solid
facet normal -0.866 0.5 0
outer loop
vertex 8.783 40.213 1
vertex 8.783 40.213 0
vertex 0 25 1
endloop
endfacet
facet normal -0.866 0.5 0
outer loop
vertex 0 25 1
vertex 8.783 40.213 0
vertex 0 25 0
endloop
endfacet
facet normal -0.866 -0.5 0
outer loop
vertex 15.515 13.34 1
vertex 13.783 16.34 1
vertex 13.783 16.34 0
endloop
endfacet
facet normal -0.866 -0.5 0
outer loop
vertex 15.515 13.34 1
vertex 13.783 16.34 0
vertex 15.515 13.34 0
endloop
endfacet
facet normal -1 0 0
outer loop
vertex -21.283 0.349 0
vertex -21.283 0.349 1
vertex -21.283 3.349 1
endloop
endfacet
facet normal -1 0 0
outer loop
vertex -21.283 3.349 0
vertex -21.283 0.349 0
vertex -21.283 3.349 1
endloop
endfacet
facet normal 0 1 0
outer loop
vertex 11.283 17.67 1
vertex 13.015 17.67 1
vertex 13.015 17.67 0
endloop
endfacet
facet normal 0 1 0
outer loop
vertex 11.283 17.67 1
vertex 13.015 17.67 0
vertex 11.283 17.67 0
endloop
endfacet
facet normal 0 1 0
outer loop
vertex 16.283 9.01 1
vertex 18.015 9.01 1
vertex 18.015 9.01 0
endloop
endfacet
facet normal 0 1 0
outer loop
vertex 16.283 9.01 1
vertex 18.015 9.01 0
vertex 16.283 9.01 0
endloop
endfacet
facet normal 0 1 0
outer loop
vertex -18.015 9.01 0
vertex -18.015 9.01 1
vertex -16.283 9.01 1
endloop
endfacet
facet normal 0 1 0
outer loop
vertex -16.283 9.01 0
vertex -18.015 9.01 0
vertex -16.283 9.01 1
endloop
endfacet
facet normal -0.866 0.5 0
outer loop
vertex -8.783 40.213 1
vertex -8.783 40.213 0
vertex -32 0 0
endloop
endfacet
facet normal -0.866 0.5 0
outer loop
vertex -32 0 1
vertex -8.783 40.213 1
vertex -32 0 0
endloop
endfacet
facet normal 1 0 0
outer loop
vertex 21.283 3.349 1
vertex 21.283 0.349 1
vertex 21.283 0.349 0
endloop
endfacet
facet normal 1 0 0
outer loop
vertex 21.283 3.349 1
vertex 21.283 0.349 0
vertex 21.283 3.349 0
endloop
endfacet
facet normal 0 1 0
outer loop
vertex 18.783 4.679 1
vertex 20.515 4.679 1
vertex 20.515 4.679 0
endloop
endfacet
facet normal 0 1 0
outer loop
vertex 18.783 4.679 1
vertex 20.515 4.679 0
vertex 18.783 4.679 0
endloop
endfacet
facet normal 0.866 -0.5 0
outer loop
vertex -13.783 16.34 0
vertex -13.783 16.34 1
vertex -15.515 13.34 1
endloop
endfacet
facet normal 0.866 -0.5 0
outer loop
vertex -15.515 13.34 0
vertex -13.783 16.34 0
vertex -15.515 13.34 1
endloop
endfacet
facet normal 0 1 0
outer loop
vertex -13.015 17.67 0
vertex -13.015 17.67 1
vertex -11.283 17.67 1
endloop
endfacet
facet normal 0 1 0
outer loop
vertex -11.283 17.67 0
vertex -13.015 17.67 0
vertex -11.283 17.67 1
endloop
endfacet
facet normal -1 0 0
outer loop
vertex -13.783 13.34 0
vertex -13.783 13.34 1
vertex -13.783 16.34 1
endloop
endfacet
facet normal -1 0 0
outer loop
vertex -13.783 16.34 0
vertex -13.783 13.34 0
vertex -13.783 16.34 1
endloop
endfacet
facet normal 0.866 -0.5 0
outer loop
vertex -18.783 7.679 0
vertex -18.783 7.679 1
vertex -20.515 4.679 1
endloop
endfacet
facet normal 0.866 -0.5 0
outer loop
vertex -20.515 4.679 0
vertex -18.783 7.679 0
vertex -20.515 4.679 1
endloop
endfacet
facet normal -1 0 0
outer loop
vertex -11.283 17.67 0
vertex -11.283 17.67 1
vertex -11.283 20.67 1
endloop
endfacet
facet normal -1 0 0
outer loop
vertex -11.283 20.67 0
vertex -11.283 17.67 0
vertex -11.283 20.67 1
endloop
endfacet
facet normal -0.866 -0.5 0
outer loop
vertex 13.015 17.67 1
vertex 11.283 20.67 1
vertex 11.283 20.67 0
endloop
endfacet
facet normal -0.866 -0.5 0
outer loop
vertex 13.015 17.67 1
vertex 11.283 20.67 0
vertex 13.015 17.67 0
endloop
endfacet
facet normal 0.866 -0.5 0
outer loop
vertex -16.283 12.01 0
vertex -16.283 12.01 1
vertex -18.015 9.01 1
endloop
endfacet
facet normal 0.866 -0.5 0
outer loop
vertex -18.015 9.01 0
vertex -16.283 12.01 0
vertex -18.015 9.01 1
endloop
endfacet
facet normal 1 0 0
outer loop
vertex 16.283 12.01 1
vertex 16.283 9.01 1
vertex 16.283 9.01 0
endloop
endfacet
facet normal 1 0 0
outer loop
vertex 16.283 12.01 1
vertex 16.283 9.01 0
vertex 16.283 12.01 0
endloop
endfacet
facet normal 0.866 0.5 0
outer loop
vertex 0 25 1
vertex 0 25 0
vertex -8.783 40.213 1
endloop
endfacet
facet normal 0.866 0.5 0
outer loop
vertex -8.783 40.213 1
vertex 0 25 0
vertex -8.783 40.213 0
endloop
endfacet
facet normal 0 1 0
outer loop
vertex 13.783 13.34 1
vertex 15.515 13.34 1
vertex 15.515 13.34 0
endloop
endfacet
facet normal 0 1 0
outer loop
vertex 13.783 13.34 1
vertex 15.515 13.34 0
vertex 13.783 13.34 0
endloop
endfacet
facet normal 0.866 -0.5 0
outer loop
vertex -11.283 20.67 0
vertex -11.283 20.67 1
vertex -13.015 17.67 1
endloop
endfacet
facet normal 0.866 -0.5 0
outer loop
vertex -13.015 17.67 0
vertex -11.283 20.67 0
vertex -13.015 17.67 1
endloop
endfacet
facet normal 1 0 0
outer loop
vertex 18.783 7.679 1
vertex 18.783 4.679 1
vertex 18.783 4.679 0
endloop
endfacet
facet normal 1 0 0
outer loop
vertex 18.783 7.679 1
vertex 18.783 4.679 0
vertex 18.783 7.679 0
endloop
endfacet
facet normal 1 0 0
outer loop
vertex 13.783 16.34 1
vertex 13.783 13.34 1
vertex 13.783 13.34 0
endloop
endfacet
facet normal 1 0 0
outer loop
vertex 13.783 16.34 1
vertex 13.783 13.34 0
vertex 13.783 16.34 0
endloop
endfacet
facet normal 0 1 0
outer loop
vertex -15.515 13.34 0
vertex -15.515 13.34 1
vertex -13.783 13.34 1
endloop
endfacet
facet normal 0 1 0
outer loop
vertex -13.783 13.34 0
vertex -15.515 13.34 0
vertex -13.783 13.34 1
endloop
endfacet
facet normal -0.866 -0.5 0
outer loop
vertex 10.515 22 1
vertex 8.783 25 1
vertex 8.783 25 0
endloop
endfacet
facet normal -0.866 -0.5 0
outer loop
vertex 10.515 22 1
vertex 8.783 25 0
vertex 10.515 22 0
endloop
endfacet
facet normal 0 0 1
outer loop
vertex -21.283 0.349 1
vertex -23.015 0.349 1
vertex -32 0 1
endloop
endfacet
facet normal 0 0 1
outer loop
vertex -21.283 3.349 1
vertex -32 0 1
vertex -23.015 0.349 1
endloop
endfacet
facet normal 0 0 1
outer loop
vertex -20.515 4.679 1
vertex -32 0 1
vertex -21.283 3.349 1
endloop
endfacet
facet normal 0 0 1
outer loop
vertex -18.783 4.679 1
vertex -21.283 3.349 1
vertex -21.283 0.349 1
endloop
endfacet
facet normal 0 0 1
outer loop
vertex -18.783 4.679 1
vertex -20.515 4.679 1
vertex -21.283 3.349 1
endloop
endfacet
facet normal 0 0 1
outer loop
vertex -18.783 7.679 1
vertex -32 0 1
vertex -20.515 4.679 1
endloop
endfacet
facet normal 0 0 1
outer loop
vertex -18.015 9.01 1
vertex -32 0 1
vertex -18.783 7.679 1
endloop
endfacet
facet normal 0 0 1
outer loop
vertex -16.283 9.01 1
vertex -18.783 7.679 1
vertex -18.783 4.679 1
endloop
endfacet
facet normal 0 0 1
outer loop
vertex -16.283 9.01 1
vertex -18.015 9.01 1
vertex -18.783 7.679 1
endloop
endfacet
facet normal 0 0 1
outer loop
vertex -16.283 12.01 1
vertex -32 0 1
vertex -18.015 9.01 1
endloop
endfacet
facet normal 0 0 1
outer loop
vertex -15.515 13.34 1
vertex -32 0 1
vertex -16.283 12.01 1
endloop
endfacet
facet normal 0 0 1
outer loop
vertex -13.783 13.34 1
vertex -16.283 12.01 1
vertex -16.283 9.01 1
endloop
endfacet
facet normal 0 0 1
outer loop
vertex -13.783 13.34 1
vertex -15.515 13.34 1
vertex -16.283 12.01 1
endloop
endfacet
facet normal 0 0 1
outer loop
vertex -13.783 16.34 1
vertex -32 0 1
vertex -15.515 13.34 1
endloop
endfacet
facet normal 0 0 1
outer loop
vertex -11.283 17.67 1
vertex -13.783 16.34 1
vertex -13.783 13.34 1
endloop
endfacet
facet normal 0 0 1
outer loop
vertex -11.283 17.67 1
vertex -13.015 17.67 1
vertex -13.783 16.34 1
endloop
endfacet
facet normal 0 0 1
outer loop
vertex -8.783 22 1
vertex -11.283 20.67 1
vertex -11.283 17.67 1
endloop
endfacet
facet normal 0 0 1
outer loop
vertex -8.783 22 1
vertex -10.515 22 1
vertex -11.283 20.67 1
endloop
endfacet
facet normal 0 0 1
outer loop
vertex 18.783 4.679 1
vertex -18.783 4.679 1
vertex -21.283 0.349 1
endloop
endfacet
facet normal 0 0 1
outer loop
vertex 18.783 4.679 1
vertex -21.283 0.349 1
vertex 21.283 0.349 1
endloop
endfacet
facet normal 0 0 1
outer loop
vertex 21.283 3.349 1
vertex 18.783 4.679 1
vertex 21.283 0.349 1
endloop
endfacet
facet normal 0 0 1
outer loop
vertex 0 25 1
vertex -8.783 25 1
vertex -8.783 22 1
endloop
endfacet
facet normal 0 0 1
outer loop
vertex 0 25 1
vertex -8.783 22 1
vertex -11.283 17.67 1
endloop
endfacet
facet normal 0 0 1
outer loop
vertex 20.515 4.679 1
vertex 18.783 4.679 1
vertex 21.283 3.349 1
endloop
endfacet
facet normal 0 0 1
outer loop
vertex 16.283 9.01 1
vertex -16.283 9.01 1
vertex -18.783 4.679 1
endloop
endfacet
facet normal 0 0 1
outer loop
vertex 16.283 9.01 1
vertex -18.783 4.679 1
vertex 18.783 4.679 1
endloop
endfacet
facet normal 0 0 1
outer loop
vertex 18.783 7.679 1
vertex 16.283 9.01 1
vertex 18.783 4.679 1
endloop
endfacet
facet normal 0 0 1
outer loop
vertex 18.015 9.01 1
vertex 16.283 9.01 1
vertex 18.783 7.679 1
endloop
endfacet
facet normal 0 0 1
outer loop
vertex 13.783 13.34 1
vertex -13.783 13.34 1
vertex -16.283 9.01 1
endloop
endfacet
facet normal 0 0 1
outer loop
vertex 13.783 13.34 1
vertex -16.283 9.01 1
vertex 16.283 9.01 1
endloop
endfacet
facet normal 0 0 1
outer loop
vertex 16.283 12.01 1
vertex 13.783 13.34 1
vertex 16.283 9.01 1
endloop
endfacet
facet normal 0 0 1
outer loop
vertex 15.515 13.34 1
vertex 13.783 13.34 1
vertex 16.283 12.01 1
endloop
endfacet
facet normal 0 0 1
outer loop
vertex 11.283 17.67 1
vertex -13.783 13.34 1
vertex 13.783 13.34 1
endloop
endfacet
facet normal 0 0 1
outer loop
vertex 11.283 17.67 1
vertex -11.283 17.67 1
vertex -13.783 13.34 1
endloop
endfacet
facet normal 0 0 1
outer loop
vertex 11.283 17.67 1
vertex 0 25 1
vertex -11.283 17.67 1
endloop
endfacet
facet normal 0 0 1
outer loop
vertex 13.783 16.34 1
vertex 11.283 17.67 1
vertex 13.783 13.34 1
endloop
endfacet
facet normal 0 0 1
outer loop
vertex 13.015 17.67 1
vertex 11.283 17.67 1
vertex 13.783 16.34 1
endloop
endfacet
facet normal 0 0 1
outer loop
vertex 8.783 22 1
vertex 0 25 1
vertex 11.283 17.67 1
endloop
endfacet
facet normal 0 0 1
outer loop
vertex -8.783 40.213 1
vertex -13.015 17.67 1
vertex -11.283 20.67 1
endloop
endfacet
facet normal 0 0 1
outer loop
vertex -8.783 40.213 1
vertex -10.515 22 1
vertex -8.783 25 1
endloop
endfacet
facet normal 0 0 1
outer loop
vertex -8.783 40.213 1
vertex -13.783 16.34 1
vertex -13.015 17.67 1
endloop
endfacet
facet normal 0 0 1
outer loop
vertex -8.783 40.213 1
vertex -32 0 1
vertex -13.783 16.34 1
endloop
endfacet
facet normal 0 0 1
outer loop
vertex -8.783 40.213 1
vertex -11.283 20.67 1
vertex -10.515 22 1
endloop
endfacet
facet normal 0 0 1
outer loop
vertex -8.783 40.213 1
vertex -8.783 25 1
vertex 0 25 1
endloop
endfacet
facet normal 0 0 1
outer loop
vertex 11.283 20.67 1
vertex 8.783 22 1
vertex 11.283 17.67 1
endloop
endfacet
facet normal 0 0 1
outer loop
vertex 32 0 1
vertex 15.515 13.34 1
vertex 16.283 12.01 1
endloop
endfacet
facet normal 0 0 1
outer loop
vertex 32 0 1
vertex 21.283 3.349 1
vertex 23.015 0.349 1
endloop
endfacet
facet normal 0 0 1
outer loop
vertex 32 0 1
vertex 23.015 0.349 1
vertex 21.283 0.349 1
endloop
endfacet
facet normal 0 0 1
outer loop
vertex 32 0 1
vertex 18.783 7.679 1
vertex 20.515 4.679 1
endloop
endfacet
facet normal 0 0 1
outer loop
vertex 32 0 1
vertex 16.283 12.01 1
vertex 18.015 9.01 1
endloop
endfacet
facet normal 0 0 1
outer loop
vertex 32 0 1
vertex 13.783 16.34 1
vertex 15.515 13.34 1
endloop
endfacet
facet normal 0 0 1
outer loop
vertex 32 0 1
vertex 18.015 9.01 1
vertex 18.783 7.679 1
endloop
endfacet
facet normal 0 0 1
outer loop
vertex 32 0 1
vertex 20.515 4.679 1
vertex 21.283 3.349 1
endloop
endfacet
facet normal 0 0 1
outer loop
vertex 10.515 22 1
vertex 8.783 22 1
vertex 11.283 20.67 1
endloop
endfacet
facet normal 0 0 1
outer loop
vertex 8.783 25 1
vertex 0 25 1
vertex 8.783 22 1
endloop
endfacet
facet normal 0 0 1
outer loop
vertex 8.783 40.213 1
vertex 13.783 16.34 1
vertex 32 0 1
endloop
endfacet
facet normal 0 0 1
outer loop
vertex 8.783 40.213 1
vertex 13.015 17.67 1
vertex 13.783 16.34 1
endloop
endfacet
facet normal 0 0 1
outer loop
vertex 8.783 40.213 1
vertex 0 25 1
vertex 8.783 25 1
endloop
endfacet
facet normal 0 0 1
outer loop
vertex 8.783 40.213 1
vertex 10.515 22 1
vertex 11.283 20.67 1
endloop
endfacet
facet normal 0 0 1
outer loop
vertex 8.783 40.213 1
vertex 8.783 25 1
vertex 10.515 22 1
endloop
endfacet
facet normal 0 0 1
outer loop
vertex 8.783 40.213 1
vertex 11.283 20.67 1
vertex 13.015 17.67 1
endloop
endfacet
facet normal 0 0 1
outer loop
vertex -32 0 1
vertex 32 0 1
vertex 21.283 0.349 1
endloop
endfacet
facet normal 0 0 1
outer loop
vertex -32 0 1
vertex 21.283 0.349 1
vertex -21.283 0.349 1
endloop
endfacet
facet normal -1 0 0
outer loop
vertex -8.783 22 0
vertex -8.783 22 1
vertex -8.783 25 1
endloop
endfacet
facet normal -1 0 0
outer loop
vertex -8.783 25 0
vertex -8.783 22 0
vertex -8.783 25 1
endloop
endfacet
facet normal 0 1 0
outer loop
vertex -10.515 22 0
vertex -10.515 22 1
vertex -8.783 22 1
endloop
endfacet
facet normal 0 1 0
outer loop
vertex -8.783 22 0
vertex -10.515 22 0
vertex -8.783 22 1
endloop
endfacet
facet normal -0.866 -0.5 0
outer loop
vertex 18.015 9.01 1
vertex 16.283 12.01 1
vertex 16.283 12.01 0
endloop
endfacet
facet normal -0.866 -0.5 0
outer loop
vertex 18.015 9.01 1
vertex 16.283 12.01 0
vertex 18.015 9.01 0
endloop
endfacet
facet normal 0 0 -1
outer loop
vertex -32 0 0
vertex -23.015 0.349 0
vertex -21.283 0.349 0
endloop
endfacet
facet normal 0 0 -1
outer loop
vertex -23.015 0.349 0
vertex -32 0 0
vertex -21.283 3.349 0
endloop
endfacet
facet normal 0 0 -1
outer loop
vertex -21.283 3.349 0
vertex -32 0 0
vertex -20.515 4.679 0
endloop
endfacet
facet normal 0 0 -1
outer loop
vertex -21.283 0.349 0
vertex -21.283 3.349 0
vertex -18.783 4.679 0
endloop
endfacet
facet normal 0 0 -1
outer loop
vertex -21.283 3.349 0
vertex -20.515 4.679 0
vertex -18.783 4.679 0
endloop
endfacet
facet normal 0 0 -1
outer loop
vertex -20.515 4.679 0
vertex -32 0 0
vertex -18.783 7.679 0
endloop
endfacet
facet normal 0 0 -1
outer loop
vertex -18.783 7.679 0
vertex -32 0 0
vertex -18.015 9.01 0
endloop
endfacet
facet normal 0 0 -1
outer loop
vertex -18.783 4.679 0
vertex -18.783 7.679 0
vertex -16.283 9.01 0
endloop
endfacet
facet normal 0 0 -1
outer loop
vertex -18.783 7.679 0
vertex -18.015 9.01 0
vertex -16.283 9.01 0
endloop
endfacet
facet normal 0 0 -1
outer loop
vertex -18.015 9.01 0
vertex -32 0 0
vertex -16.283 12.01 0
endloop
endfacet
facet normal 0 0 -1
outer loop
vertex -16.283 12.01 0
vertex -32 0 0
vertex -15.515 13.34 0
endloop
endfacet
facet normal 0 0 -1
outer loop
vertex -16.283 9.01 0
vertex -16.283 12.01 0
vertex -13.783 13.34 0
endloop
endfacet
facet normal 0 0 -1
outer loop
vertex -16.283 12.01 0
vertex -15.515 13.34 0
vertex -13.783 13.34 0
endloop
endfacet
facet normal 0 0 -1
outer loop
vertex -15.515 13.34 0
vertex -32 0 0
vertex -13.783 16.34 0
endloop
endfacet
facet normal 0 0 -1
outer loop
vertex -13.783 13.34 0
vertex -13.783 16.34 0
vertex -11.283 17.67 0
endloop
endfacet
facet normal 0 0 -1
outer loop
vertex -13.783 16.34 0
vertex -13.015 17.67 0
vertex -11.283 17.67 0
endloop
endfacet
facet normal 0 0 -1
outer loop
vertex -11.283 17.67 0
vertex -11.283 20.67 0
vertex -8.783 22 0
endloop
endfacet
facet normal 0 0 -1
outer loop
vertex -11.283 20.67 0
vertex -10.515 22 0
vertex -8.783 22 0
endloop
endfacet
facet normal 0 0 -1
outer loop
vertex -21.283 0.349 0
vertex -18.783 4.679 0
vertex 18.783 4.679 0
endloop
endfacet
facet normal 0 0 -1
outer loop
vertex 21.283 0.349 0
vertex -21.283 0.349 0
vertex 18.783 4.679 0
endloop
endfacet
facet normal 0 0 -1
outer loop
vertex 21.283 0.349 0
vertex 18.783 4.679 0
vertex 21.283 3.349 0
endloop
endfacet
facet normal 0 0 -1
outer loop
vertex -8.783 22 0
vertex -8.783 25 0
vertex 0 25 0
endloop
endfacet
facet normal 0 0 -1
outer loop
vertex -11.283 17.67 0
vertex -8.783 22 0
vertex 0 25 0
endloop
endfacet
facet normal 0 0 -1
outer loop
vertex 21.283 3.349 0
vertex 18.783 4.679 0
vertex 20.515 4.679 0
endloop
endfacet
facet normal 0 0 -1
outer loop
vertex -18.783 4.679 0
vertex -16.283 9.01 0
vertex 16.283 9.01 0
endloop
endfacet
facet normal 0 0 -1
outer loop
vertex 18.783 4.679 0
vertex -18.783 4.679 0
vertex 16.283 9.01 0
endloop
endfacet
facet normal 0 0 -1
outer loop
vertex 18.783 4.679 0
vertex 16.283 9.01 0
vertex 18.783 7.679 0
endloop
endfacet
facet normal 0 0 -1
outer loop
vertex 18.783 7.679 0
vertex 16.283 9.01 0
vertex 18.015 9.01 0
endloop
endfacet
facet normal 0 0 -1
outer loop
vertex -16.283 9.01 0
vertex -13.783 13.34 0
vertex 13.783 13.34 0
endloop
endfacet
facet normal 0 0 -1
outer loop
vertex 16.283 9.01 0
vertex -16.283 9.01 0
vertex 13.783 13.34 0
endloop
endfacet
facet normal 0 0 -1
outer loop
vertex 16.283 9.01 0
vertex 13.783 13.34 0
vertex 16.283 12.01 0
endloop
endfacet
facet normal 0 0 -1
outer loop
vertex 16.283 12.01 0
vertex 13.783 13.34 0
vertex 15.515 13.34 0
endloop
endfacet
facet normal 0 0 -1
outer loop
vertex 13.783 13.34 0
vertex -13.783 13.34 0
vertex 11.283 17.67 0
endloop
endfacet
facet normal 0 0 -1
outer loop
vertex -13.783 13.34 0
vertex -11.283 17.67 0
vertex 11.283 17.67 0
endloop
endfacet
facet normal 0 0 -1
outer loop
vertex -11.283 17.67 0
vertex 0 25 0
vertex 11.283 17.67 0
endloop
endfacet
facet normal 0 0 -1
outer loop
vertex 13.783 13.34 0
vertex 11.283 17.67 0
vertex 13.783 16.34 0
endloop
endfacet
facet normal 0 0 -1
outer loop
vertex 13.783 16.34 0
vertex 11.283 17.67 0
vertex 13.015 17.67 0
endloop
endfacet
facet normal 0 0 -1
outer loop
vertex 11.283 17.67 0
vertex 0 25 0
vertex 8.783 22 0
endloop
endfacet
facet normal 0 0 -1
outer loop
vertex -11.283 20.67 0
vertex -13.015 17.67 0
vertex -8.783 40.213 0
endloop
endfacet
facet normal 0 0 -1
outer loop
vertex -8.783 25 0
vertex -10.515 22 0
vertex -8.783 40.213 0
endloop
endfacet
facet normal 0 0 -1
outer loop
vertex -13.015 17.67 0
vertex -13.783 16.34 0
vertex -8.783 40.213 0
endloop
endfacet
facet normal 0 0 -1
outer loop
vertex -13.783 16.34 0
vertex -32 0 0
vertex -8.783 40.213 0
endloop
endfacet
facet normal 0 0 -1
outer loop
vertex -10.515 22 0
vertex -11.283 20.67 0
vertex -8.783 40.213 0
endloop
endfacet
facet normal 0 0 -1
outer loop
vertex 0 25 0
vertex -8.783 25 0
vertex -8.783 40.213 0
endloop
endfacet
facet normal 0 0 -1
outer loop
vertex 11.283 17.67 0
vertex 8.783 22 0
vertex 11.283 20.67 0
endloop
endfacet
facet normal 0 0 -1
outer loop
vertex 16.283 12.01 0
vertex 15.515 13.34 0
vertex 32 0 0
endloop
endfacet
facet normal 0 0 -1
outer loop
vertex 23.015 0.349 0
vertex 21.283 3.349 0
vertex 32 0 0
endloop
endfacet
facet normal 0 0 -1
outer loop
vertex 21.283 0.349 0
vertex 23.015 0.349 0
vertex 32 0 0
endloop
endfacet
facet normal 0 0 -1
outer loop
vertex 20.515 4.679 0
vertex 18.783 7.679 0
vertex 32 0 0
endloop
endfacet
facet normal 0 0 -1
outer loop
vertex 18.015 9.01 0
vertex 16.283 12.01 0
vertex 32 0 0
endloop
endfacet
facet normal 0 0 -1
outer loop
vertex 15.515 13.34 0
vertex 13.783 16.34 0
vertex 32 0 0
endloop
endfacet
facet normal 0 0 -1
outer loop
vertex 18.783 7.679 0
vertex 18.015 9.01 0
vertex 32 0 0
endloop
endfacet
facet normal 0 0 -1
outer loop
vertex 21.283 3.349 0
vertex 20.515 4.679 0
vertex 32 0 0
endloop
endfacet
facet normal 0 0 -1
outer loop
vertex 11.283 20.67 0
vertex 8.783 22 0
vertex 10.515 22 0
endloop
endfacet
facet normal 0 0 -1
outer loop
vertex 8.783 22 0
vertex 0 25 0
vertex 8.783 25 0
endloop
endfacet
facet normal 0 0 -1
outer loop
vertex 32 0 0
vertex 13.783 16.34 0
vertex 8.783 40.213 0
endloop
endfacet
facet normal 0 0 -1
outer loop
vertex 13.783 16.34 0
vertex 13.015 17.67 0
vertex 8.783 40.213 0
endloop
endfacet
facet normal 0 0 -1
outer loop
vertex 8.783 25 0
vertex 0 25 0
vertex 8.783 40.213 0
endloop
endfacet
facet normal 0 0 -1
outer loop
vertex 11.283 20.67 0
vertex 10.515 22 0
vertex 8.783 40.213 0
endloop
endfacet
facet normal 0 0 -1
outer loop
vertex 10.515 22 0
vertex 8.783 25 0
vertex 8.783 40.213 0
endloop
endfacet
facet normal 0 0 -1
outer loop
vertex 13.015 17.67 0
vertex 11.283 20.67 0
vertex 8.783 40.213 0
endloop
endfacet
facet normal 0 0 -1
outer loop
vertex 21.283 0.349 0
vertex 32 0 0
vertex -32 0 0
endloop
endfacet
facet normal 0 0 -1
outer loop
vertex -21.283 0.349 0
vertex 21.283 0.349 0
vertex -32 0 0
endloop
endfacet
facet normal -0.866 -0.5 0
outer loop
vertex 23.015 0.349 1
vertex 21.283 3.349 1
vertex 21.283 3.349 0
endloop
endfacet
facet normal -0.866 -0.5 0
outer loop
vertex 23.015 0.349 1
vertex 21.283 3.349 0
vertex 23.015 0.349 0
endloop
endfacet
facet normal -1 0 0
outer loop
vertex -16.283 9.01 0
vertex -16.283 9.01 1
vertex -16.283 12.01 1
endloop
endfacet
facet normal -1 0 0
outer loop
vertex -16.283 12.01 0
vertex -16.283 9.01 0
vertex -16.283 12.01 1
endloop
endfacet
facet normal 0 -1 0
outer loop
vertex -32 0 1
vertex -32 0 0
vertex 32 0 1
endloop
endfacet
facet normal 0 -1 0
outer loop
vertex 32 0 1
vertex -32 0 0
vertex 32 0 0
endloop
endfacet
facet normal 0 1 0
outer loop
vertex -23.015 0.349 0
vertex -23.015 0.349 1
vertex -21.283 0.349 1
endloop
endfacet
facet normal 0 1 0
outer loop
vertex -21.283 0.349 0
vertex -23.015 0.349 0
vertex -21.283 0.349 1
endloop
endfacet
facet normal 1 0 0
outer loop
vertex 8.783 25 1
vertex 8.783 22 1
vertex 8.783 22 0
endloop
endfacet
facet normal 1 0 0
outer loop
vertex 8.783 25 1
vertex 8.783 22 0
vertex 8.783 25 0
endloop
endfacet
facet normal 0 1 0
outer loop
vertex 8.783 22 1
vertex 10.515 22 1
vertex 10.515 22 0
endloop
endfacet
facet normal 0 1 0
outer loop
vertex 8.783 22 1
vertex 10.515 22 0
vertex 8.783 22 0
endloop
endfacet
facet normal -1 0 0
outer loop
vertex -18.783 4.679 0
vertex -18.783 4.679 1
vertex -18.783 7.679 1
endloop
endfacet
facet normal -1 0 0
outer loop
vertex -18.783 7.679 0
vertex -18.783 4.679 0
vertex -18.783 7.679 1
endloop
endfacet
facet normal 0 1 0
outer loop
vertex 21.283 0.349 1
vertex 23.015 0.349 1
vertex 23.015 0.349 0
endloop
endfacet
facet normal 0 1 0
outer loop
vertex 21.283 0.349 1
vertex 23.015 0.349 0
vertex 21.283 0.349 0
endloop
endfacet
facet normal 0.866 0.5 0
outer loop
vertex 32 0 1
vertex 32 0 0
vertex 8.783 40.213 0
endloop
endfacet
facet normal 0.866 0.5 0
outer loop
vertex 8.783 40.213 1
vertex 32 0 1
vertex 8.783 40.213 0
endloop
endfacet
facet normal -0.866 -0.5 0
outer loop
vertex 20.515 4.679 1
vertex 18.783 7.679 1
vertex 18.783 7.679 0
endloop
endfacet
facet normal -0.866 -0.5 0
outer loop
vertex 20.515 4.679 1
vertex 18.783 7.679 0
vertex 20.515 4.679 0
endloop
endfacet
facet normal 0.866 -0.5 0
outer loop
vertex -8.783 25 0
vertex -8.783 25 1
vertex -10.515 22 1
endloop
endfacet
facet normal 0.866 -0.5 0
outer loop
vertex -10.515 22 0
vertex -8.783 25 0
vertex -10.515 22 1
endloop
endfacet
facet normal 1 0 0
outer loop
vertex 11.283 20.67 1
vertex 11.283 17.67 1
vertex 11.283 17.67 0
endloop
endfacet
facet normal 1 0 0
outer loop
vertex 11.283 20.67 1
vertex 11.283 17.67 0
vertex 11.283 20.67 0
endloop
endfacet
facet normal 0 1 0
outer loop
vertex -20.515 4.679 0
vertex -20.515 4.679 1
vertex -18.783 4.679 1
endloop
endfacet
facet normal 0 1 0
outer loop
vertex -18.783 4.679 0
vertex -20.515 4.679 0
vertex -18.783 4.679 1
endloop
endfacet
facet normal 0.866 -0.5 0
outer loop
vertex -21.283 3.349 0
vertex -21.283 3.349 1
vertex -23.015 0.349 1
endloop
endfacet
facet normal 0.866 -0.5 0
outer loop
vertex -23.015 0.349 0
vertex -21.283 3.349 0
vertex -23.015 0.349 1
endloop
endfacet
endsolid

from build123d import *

# Parameters (mm, degrees)
EXTRUDE_1_DEPTH     = 1
CUT_EXTRUDE_1_DEPTH = 52.40107317


with BuildPart() as part:
    # 草图1 → 凸台-拉伸1 (new body)
    with BuildSketch(Plane.XY):
        Polygon((-32, 0), (32, 0), (8.783121635, 40.212812921), (0, 25), (-8.783121635, 40.212812921), align=None)
    extrude(amount=EXTRUDE_1_DEPTH)

    # 草图2 → 切除-拉伸1 (cut, through all)
    with BuildSketch(Plane.XY.offset(1)):
        Polygon((-8.783121635, 25), (-10.515172443, 22), (-8.783121635, 22), align=None)
        Polygon((-11.283121635, 17.669872981), (-11.283121635, 20.669872981), (-13.015172443, 17.669872981), align=None)
        Polygon((-13.783121635, 13.339745962), (-13.783121635, 16.339745962), (-15.515172443, 13.339745962), align=None)
        Polygon((-16.283121635, 9.009618943), (-16.283121635, 12.009618943), (-18.015172443, 9.009618943), align=None)
        Polygon((-18.783121635, 4.679491924), (-18.783121635, 7.679491924), (-20.515172443, 4.679491924), align=None)
        Polygon((-21.283121635, 0.349364905), (-21.283121635, 3.349364905), (-23.015172443, 0.349364905), align=None)
        Polygon((23.015172443, 0.349364905), (21.283121635, 0.349364905), (21.283121635, 3.349364905), align=None)
        Polygon((20.515172443, 4.679491924), (18.783121635, 4.679491924), (18.783121635, 7.679491924), align=None)
        Polygon((18.015172443, 9.009618943), (16.283121635, 9.009618943), (16.283121635, 12.009618943), align=None)
        Polygon((15.515172443, 13.339745962), (13.783121635, 13.339745962), (13.783121635, 16.339745962), align=None)
        Polygon((13.015172443, 17.669872981), (11.283121635, 17.669872981), (11.283121635, 20.669872981), align=None)
        Polygon((10.515172443, 22), (8.783121635, 22), (8.783121635, 25), align=None)
    extrude(amount=-CUT_EXTRUDE_1_DEPTH, mode=Mode.SUBTRACT)


solid = part.part
